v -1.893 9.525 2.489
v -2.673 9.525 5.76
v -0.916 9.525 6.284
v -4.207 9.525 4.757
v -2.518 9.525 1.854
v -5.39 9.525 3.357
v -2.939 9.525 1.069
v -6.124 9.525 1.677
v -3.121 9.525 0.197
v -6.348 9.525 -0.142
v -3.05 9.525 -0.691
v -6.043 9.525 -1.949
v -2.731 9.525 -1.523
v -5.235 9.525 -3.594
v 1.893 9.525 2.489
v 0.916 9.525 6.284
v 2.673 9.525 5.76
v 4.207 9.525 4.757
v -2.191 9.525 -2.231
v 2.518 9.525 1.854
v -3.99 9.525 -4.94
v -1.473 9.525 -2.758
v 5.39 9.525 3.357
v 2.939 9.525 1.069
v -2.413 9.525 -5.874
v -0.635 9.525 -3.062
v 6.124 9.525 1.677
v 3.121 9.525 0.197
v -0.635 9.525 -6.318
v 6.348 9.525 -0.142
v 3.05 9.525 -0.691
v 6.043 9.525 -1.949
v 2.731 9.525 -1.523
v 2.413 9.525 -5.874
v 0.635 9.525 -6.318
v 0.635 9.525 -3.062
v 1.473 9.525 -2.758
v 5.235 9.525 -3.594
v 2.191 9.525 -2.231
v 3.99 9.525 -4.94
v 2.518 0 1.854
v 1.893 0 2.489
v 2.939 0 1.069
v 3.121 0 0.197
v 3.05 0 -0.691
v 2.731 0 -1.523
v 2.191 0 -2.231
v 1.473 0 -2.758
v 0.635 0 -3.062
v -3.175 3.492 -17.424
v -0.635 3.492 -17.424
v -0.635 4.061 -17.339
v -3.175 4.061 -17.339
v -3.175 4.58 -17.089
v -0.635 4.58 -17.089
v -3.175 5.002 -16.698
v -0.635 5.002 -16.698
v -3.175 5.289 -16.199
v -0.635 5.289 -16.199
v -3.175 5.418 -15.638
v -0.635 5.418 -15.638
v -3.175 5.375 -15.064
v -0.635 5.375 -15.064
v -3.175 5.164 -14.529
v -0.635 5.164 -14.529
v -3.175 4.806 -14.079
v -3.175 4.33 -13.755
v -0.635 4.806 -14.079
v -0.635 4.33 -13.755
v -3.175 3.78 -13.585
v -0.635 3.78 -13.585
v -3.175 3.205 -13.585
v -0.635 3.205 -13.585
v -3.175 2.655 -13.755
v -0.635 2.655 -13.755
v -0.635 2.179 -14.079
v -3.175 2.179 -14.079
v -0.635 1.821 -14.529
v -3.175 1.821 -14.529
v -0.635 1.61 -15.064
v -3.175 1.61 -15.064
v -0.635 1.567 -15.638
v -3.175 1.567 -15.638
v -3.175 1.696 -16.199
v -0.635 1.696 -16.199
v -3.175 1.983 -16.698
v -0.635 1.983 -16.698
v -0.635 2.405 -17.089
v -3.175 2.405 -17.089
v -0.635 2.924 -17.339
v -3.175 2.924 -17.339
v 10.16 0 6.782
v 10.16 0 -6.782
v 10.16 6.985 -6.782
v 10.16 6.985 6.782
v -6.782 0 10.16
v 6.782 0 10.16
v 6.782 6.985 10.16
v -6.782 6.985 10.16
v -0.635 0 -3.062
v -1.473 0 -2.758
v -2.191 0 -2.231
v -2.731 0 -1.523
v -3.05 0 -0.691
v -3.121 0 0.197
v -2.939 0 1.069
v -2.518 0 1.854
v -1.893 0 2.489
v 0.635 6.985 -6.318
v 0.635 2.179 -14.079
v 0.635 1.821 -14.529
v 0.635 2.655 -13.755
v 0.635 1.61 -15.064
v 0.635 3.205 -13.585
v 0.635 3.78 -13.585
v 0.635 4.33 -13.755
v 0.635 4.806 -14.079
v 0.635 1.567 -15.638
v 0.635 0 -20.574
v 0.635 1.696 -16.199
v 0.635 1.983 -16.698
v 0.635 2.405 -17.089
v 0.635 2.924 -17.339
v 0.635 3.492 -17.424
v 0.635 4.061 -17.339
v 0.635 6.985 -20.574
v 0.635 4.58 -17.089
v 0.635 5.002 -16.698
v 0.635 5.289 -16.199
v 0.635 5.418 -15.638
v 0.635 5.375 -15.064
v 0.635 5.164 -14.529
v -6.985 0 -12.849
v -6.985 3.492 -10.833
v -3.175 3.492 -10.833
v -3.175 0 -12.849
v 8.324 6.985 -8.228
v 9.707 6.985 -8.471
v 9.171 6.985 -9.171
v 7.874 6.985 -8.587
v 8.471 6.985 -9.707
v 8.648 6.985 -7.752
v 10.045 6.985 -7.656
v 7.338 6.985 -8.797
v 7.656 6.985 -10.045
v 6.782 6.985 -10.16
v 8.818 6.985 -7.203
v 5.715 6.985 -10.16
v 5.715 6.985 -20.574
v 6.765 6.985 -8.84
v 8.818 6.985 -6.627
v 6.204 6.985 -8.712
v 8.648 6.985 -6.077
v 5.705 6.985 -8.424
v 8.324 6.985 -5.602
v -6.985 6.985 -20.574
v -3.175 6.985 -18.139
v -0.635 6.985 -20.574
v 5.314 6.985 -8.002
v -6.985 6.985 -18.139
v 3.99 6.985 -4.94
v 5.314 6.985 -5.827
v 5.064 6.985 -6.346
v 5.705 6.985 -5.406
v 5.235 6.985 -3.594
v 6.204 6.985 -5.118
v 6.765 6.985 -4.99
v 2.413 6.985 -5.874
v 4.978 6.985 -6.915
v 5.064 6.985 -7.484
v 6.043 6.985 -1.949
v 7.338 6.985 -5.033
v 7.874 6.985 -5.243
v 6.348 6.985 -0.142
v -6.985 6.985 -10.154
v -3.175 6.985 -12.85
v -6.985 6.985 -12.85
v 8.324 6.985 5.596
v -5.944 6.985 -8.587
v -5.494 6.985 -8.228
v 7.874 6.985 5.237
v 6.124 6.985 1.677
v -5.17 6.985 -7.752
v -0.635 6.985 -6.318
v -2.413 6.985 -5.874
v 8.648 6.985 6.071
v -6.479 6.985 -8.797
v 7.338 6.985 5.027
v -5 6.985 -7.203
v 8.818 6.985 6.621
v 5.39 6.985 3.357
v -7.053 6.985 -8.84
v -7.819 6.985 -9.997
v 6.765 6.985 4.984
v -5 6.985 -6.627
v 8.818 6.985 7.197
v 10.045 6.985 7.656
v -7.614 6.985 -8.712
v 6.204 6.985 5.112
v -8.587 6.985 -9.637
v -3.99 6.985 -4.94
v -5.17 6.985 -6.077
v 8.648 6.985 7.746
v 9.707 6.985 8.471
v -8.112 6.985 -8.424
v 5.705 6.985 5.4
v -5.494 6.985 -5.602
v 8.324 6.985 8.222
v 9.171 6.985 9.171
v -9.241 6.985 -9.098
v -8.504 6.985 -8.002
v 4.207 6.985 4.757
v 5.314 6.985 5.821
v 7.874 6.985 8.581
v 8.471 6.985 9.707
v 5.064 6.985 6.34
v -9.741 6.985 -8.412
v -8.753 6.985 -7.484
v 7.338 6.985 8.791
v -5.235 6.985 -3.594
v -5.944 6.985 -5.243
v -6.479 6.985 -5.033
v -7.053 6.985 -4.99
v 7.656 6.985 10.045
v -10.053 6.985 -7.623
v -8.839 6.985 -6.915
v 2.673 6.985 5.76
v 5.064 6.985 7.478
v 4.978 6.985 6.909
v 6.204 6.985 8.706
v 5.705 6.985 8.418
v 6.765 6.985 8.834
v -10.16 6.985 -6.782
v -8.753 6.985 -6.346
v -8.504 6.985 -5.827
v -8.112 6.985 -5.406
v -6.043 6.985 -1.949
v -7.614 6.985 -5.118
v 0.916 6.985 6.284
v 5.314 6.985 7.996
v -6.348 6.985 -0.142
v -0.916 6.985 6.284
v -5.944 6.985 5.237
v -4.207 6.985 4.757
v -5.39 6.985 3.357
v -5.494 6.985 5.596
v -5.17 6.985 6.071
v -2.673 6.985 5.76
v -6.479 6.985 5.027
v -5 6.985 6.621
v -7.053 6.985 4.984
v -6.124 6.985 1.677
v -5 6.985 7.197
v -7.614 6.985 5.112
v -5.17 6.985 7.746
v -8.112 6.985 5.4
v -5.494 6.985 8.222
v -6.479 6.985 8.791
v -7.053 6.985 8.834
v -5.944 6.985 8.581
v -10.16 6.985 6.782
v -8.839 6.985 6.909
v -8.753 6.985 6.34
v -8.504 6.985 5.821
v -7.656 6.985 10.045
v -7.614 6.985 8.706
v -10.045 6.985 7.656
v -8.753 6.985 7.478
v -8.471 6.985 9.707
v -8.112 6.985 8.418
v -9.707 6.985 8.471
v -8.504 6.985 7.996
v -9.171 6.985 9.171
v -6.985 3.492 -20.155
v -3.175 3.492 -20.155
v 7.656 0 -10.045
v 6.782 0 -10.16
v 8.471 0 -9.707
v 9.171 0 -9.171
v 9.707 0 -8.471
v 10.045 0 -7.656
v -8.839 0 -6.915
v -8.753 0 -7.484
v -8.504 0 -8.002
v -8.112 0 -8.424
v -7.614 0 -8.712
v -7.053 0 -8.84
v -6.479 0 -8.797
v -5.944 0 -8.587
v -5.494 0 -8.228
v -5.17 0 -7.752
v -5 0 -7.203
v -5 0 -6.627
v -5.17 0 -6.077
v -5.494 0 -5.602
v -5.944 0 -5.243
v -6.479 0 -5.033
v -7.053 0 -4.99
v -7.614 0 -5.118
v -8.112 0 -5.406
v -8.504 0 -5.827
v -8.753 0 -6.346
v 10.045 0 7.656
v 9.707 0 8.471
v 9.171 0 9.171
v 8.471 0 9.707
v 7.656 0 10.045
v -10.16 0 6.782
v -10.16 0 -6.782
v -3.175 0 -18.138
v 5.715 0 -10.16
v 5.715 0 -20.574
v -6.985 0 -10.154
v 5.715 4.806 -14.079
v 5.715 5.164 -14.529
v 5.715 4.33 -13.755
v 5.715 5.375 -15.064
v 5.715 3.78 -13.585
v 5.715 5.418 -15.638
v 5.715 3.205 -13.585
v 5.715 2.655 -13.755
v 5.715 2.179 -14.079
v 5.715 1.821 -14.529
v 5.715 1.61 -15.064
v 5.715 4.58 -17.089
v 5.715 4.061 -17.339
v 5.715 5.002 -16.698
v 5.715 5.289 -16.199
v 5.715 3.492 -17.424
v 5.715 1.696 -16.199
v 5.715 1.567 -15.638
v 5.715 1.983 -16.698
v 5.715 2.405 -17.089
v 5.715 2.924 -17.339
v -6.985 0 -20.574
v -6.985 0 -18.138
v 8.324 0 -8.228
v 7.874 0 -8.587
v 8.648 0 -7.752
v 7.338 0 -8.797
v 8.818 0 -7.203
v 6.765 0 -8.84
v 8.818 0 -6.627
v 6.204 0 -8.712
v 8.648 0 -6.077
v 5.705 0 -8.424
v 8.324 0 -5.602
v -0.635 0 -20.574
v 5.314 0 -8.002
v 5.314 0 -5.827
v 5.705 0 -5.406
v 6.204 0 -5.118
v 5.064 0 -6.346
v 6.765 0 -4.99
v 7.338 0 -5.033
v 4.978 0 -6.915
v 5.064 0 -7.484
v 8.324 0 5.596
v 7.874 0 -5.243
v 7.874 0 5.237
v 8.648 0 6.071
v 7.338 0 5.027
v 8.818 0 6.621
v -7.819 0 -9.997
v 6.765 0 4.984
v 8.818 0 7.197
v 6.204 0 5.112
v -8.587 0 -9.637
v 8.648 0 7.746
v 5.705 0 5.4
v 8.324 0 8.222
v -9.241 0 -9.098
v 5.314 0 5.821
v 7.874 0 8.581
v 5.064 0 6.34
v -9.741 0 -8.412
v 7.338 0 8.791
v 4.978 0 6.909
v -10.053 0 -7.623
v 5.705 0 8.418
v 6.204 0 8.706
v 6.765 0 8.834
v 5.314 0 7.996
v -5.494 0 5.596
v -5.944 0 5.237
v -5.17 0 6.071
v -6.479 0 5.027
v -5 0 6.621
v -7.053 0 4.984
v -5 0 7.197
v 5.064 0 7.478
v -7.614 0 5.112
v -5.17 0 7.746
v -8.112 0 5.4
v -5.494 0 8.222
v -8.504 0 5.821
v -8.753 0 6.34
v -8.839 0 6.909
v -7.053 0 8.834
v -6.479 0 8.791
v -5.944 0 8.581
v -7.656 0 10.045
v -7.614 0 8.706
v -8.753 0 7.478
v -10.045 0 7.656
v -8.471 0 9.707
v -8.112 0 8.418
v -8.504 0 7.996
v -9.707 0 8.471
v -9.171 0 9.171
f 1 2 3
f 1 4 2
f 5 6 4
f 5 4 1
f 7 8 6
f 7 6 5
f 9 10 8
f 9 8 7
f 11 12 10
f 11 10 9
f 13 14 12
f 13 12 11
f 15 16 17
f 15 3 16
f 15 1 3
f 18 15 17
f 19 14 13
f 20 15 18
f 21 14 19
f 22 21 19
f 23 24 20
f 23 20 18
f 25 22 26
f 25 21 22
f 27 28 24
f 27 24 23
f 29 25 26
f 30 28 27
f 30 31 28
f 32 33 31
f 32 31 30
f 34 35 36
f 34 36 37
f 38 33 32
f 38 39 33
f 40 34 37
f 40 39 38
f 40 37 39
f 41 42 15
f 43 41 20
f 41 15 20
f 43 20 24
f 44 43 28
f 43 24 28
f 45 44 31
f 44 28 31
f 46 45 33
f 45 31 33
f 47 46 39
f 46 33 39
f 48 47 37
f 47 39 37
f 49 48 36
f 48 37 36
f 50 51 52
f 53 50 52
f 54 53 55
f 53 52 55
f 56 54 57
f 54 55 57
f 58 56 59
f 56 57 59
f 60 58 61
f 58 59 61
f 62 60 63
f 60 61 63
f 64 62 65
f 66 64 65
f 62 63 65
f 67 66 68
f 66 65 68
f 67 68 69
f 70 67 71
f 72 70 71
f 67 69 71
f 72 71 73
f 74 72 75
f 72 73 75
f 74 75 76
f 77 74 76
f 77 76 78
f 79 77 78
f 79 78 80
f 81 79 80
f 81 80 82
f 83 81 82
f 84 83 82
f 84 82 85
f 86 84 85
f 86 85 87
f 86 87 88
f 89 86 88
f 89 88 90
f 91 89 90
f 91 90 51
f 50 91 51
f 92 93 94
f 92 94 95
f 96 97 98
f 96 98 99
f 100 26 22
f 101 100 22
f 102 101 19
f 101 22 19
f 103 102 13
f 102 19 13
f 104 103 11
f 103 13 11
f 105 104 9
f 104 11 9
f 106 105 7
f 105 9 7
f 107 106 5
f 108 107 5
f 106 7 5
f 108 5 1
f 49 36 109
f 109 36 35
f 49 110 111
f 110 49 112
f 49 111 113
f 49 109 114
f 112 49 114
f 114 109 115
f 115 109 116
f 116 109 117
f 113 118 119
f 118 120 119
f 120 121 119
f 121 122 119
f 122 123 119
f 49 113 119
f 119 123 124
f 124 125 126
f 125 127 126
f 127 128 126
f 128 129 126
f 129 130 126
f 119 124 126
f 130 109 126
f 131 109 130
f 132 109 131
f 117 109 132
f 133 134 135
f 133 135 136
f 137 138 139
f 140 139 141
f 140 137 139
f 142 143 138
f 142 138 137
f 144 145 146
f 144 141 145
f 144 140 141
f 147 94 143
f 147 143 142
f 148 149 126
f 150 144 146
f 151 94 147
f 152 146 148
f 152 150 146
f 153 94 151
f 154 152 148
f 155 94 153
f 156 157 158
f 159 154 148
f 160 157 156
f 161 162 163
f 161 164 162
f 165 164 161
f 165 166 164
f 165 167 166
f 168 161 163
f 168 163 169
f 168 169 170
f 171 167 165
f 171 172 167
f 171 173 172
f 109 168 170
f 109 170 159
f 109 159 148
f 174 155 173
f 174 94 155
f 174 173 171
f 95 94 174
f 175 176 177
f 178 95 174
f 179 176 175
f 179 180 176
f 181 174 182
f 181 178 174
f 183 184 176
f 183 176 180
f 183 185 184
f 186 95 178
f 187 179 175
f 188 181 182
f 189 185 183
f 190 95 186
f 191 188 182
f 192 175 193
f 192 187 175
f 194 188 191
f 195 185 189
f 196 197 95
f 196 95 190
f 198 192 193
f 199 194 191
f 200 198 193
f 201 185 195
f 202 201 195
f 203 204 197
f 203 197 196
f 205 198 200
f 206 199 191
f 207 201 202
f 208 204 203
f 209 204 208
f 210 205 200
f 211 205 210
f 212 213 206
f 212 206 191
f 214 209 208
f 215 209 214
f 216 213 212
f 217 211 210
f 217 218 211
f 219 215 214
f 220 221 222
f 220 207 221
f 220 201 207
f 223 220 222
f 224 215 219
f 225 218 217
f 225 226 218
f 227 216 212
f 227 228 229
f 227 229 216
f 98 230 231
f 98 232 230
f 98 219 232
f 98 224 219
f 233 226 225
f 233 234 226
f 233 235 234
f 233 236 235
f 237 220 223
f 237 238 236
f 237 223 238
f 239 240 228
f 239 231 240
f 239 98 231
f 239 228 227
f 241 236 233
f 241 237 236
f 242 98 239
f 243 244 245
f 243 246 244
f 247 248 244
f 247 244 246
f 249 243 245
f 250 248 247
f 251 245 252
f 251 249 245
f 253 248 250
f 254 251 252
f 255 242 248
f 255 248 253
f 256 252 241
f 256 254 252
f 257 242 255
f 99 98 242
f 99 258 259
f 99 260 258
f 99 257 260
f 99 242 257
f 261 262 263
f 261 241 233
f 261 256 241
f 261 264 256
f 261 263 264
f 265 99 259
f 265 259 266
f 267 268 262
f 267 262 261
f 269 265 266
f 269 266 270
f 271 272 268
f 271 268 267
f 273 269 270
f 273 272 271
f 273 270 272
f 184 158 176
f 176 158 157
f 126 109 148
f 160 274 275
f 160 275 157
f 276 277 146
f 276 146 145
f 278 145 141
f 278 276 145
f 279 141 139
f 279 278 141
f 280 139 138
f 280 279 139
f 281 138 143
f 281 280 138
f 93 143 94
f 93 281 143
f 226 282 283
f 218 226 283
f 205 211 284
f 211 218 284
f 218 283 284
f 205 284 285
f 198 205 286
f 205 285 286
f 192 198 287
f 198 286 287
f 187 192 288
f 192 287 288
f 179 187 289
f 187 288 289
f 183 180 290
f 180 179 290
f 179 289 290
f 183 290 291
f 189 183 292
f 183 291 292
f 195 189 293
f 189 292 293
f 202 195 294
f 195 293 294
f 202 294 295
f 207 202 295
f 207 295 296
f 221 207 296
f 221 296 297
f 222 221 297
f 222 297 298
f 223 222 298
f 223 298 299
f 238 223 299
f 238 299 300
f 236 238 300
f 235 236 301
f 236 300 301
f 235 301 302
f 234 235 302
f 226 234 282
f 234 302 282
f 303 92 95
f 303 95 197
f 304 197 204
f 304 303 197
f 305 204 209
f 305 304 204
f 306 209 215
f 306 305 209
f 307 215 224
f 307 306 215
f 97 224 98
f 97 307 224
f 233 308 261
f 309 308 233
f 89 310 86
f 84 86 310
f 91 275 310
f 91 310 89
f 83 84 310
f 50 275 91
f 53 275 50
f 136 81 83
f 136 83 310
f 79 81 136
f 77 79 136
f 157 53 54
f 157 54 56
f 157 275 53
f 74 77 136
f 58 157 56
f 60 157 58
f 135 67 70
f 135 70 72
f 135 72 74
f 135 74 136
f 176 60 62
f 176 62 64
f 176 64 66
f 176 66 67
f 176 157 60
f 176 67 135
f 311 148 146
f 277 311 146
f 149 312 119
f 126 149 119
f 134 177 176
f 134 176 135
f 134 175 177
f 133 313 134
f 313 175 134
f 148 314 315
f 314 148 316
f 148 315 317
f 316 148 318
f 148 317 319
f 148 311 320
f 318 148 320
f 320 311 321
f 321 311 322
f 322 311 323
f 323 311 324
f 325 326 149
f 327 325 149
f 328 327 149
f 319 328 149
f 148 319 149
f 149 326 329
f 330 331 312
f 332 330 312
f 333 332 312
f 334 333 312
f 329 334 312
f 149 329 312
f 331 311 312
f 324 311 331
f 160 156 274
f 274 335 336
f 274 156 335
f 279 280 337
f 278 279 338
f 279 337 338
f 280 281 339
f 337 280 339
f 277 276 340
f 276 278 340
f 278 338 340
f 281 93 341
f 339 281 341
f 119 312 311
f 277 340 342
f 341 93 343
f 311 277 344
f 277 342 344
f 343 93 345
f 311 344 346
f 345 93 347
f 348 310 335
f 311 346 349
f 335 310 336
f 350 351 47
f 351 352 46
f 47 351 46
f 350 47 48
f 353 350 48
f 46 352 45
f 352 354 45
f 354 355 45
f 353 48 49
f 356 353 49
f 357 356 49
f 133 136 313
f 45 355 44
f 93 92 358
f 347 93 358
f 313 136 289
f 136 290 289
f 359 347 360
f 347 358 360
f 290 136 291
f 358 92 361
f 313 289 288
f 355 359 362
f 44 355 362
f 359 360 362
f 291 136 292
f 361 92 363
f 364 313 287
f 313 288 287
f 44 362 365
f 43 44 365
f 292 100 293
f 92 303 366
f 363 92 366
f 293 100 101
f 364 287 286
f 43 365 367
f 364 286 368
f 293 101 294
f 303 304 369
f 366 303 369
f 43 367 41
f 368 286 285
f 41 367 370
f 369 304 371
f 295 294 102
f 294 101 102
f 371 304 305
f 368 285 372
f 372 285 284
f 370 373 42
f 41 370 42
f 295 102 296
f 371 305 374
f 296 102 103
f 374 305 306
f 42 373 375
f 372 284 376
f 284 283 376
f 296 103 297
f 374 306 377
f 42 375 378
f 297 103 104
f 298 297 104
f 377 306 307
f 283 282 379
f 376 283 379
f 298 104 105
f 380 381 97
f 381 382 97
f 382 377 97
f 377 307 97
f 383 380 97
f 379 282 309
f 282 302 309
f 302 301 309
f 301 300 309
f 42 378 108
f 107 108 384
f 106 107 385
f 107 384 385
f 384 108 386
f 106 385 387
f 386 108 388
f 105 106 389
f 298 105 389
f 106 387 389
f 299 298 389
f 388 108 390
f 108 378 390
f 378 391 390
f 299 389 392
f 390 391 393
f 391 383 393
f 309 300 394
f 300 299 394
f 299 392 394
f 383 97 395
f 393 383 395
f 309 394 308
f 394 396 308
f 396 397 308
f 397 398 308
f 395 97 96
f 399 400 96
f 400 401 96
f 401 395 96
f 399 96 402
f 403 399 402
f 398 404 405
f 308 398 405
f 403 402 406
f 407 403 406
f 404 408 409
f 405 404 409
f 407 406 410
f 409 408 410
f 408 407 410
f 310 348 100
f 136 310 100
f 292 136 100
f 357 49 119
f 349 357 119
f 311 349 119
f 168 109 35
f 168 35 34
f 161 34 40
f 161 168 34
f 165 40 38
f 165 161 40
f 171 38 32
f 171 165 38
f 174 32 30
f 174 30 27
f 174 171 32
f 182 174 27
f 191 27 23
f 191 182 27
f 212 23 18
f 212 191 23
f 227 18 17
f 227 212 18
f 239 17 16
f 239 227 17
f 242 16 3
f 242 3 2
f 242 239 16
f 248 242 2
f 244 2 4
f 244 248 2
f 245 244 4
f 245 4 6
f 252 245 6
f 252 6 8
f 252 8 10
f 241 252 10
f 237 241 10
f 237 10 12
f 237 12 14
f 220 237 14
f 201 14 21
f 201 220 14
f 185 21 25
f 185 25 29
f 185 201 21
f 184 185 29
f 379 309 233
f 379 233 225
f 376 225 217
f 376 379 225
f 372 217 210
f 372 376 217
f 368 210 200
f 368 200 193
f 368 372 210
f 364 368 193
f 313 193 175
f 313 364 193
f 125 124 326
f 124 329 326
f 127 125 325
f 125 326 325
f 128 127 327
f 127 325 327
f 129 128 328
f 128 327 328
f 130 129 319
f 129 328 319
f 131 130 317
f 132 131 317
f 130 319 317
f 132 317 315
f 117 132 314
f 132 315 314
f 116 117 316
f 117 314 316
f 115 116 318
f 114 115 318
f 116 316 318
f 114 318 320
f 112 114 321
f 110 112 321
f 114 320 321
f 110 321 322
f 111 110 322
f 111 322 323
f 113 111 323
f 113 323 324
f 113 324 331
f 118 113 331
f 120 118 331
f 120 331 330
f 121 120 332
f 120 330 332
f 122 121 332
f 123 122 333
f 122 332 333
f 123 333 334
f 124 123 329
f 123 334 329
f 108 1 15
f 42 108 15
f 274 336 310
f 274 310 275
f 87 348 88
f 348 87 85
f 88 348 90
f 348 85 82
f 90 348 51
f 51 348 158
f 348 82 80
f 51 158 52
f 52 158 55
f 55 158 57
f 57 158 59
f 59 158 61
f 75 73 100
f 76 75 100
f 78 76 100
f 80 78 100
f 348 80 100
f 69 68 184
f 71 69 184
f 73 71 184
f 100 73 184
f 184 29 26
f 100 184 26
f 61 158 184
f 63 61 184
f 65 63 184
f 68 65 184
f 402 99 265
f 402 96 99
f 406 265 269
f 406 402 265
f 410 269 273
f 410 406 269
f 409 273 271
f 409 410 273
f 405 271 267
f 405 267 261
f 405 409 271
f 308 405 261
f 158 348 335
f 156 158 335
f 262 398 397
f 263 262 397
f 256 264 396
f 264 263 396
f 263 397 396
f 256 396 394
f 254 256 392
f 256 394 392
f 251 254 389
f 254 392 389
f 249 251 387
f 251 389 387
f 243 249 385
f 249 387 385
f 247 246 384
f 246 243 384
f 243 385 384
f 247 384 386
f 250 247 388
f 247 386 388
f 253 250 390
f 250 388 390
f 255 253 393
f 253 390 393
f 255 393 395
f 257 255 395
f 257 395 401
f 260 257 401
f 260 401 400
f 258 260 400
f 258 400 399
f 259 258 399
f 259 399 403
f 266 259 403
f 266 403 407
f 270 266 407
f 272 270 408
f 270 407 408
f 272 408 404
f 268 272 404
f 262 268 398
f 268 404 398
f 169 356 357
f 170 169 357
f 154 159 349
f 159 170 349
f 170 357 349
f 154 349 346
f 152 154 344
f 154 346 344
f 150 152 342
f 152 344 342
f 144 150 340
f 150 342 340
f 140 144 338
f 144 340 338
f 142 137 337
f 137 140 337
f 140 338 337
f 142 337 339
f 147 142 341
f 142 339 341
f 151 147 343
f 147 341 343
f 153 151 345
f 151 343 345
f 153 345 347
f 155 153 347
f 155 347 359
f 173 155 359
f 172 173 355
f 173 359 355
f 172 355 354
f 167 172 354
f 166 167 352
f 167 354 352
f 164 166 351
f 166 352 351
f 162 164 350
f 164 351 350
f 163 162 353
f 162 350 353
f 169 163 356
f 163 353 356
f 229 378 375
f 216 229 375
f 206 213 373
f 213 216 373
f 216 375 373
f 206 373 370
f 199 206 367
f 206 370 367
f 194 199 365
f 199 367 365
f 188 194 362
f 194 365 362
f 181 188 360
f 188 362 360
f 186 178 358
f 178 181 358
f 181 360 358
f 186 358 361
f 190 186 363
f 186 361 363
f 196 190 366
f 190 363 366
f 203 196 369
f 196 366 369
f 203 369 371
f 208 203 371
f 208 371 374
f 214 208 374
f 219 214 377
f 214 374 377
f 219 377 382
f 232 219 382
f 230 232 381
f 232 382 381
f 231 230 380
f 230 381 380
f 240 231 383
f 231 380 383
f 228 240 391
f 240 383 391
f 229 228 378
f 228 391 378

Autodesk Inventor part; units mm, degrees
ref_plane "YZ Plane" through (0, 0, 0) normal (1, 0, 0) x (0, 1, 0)
ref_plane "XZ Plane" through (0, 0, 0) normal (0, 1, 0) x (-1, 0, 0)
ref_plane "XY Plane" through (0, 0, 0) normal (0, 0, 1) x (1, 0, 0)
sketch "Sketch1" plane through (0, 0, 0) normal (0, 1, 0) x (-1, 0, 0)
  line L0 (-10.16, 10.16) -> (10.16, 10.16)
  line L1 (10.16, 10.16) -> (10.16, -10.16)
  line L2 (-10.16, -10.16) -> (-10.16, 10.16)
  circle A0 centre (6.9088, -6.9148) radius 1.9304
  circle A1 centre (6.9088, 6.9088) radius 1.9304
  circle A2 centre (-6.9088, 6.9088) radius 1.9304
  circle A3 centre (-6.9088, -6.9148) radius 1.9304
  line L3 (-5.715, -10.16) -> (-5.715, -20.574)
  line L4 (-5.715, -20.574) -> (6.985, -20.574)
  line L5 (6.985, -20.574) -> (6.985, -10.16)
  line L6 (10.16, -10.16) -> (6.985, -10.16)
  line L7 (-5.715, -10.16) -> (-10.16, -10.16)
  point P0 (0, 0)
  dimension "d0" = 20.32
  dimension "d2" = 10.16
  dimension "d3" = 10.16
  dimension "d4" = 3.8608
  dimension "d5" = 6.9148
  dimension "d6" = 6.9088
  dimension "d7" = 3.8608
  dimension "d8" = 6.9088
  dimension "d9" = 6.9088
  dimension "d10" = 3.8608
  dimension "d11" = 6.9088
  dimension "d12" = 6.9088
  dimension "d13" = 3.8608
  dimension "d14" = 12.7
  dimension "d16" = 6.985
extrude "Extrusion1" add sketch "Sketch1" along normal blind 6.985
sketch "Sketch2" plane through (-6.985, 0, -20.574) normal (-1, 0, 0) x (0, 0, 1)
  circle A0 centre (5.08, 3.4925) radius 4.6609 construction
  line L0 (10.414, 0) -> (0, 0) projected
  line L1 (0, 0) -> (0, 6.985) projected
  line L2 (9.7409, 3.4925) -> (7.4105, -0.544)
  line L3 (7.4105, -0.544) -> (2.7496, -0.544)
  line L4 (2.7496, -0.544) -> (0.4191, 3.4925)
  line L5 (0.4191, 3.4925) -> (2.7495, 7.529)
  line L6 (2.7495, 7.529) -> (7.4104, 7.529)
  line L7 (7.4104, 7.529) -> (9.7409, 3.4925)
  point P0 (20.574, 0)
  dimension "d19" = 9.3218
  dimension "d20" = 3.4925
  dimension "d21" = 5.08
extrude "Extrusion2" cut sketch "Sketch2" against normal blind 3.81
sketch "Sketch3" plane through (5.715, 0, -10.16) normal (1, 0, 0) x (0, 0, -1)
  circle A0 centre (5.334, 3.4925) radius 1.9304
  line L0 (10.414, 0) -> (10.414, 6.985) projected
  line L1 (0, 6.985) -> (10.414, 6.985) projected
  point P0 (-10.16, 0)
  dimension "d24" = 3.8608
  dimension "d25" = 5.08
  dimension "d26" = 3.4925
extrude "Extrusion3" cut sketch "Sketch3" against normal through all
sketch "Sketch4" plane through (0, 6.985, 0) normal (0, 1, 0) x (1, 0, 0)
  circle A0 centre (0, 0) radius 6.35
  dimension "d29" = 12.7
extrude "Extrusion4" add sketch "Sketch4" along normal blind 2.54
sketch "Sketch5" plane through (0, 9.525, 0) normal (0, 1, 0) x (1, 0, 0)
  arc A0 (1.8926, -2.4892) -> (-1.8926, -2.4892) centre (0, 0) ccw
  line L0 (-1.8926, -2.4892) -> (1.8926, -2.4892)
  dimension "d32" = 6.254
  dimension "d33" = 2.4892
fillet "Fillet1" radius 3.3782 4 edges at (10.16, 3.4925, 10.16) (10.16, 3.4925, -10.16) (-10.16, 3.4925, 10.16) (-10.16, 3.4925, -10.16)
extrude "Extrusion5" cut sketch "Sketch5" against normal through all
sketch "Sketch6" plane through (0, 9.525, 0) normal (0, 1, 0) x (1, 0, 0)
  line L0 (-6.985, 20.574) -> (5.715, 20.574) projected
  line L1 (0.635, 0) -> (0.635, 20.574)
  line L2 (0.635, 20.574) -> (-0.635, 20.574)
  line L3 (-0.635, 20.574) -> (-0.635, 0)
  line L4 (-0.635, -20.574) -> (0.635, 20.574) construction
  line L5 (0.635, -20.574) -> (-0.635, 20.574) construction
  line L6 (-0.635, 0) -> (0.635, 0)
  point P0 (0, 0)
  dimension "d37" = 1.27
extrude "Extrusion6" cut sketch "Sketch6" against normal through all
properties part number "clamping hub 6mm to 8mm hub"
